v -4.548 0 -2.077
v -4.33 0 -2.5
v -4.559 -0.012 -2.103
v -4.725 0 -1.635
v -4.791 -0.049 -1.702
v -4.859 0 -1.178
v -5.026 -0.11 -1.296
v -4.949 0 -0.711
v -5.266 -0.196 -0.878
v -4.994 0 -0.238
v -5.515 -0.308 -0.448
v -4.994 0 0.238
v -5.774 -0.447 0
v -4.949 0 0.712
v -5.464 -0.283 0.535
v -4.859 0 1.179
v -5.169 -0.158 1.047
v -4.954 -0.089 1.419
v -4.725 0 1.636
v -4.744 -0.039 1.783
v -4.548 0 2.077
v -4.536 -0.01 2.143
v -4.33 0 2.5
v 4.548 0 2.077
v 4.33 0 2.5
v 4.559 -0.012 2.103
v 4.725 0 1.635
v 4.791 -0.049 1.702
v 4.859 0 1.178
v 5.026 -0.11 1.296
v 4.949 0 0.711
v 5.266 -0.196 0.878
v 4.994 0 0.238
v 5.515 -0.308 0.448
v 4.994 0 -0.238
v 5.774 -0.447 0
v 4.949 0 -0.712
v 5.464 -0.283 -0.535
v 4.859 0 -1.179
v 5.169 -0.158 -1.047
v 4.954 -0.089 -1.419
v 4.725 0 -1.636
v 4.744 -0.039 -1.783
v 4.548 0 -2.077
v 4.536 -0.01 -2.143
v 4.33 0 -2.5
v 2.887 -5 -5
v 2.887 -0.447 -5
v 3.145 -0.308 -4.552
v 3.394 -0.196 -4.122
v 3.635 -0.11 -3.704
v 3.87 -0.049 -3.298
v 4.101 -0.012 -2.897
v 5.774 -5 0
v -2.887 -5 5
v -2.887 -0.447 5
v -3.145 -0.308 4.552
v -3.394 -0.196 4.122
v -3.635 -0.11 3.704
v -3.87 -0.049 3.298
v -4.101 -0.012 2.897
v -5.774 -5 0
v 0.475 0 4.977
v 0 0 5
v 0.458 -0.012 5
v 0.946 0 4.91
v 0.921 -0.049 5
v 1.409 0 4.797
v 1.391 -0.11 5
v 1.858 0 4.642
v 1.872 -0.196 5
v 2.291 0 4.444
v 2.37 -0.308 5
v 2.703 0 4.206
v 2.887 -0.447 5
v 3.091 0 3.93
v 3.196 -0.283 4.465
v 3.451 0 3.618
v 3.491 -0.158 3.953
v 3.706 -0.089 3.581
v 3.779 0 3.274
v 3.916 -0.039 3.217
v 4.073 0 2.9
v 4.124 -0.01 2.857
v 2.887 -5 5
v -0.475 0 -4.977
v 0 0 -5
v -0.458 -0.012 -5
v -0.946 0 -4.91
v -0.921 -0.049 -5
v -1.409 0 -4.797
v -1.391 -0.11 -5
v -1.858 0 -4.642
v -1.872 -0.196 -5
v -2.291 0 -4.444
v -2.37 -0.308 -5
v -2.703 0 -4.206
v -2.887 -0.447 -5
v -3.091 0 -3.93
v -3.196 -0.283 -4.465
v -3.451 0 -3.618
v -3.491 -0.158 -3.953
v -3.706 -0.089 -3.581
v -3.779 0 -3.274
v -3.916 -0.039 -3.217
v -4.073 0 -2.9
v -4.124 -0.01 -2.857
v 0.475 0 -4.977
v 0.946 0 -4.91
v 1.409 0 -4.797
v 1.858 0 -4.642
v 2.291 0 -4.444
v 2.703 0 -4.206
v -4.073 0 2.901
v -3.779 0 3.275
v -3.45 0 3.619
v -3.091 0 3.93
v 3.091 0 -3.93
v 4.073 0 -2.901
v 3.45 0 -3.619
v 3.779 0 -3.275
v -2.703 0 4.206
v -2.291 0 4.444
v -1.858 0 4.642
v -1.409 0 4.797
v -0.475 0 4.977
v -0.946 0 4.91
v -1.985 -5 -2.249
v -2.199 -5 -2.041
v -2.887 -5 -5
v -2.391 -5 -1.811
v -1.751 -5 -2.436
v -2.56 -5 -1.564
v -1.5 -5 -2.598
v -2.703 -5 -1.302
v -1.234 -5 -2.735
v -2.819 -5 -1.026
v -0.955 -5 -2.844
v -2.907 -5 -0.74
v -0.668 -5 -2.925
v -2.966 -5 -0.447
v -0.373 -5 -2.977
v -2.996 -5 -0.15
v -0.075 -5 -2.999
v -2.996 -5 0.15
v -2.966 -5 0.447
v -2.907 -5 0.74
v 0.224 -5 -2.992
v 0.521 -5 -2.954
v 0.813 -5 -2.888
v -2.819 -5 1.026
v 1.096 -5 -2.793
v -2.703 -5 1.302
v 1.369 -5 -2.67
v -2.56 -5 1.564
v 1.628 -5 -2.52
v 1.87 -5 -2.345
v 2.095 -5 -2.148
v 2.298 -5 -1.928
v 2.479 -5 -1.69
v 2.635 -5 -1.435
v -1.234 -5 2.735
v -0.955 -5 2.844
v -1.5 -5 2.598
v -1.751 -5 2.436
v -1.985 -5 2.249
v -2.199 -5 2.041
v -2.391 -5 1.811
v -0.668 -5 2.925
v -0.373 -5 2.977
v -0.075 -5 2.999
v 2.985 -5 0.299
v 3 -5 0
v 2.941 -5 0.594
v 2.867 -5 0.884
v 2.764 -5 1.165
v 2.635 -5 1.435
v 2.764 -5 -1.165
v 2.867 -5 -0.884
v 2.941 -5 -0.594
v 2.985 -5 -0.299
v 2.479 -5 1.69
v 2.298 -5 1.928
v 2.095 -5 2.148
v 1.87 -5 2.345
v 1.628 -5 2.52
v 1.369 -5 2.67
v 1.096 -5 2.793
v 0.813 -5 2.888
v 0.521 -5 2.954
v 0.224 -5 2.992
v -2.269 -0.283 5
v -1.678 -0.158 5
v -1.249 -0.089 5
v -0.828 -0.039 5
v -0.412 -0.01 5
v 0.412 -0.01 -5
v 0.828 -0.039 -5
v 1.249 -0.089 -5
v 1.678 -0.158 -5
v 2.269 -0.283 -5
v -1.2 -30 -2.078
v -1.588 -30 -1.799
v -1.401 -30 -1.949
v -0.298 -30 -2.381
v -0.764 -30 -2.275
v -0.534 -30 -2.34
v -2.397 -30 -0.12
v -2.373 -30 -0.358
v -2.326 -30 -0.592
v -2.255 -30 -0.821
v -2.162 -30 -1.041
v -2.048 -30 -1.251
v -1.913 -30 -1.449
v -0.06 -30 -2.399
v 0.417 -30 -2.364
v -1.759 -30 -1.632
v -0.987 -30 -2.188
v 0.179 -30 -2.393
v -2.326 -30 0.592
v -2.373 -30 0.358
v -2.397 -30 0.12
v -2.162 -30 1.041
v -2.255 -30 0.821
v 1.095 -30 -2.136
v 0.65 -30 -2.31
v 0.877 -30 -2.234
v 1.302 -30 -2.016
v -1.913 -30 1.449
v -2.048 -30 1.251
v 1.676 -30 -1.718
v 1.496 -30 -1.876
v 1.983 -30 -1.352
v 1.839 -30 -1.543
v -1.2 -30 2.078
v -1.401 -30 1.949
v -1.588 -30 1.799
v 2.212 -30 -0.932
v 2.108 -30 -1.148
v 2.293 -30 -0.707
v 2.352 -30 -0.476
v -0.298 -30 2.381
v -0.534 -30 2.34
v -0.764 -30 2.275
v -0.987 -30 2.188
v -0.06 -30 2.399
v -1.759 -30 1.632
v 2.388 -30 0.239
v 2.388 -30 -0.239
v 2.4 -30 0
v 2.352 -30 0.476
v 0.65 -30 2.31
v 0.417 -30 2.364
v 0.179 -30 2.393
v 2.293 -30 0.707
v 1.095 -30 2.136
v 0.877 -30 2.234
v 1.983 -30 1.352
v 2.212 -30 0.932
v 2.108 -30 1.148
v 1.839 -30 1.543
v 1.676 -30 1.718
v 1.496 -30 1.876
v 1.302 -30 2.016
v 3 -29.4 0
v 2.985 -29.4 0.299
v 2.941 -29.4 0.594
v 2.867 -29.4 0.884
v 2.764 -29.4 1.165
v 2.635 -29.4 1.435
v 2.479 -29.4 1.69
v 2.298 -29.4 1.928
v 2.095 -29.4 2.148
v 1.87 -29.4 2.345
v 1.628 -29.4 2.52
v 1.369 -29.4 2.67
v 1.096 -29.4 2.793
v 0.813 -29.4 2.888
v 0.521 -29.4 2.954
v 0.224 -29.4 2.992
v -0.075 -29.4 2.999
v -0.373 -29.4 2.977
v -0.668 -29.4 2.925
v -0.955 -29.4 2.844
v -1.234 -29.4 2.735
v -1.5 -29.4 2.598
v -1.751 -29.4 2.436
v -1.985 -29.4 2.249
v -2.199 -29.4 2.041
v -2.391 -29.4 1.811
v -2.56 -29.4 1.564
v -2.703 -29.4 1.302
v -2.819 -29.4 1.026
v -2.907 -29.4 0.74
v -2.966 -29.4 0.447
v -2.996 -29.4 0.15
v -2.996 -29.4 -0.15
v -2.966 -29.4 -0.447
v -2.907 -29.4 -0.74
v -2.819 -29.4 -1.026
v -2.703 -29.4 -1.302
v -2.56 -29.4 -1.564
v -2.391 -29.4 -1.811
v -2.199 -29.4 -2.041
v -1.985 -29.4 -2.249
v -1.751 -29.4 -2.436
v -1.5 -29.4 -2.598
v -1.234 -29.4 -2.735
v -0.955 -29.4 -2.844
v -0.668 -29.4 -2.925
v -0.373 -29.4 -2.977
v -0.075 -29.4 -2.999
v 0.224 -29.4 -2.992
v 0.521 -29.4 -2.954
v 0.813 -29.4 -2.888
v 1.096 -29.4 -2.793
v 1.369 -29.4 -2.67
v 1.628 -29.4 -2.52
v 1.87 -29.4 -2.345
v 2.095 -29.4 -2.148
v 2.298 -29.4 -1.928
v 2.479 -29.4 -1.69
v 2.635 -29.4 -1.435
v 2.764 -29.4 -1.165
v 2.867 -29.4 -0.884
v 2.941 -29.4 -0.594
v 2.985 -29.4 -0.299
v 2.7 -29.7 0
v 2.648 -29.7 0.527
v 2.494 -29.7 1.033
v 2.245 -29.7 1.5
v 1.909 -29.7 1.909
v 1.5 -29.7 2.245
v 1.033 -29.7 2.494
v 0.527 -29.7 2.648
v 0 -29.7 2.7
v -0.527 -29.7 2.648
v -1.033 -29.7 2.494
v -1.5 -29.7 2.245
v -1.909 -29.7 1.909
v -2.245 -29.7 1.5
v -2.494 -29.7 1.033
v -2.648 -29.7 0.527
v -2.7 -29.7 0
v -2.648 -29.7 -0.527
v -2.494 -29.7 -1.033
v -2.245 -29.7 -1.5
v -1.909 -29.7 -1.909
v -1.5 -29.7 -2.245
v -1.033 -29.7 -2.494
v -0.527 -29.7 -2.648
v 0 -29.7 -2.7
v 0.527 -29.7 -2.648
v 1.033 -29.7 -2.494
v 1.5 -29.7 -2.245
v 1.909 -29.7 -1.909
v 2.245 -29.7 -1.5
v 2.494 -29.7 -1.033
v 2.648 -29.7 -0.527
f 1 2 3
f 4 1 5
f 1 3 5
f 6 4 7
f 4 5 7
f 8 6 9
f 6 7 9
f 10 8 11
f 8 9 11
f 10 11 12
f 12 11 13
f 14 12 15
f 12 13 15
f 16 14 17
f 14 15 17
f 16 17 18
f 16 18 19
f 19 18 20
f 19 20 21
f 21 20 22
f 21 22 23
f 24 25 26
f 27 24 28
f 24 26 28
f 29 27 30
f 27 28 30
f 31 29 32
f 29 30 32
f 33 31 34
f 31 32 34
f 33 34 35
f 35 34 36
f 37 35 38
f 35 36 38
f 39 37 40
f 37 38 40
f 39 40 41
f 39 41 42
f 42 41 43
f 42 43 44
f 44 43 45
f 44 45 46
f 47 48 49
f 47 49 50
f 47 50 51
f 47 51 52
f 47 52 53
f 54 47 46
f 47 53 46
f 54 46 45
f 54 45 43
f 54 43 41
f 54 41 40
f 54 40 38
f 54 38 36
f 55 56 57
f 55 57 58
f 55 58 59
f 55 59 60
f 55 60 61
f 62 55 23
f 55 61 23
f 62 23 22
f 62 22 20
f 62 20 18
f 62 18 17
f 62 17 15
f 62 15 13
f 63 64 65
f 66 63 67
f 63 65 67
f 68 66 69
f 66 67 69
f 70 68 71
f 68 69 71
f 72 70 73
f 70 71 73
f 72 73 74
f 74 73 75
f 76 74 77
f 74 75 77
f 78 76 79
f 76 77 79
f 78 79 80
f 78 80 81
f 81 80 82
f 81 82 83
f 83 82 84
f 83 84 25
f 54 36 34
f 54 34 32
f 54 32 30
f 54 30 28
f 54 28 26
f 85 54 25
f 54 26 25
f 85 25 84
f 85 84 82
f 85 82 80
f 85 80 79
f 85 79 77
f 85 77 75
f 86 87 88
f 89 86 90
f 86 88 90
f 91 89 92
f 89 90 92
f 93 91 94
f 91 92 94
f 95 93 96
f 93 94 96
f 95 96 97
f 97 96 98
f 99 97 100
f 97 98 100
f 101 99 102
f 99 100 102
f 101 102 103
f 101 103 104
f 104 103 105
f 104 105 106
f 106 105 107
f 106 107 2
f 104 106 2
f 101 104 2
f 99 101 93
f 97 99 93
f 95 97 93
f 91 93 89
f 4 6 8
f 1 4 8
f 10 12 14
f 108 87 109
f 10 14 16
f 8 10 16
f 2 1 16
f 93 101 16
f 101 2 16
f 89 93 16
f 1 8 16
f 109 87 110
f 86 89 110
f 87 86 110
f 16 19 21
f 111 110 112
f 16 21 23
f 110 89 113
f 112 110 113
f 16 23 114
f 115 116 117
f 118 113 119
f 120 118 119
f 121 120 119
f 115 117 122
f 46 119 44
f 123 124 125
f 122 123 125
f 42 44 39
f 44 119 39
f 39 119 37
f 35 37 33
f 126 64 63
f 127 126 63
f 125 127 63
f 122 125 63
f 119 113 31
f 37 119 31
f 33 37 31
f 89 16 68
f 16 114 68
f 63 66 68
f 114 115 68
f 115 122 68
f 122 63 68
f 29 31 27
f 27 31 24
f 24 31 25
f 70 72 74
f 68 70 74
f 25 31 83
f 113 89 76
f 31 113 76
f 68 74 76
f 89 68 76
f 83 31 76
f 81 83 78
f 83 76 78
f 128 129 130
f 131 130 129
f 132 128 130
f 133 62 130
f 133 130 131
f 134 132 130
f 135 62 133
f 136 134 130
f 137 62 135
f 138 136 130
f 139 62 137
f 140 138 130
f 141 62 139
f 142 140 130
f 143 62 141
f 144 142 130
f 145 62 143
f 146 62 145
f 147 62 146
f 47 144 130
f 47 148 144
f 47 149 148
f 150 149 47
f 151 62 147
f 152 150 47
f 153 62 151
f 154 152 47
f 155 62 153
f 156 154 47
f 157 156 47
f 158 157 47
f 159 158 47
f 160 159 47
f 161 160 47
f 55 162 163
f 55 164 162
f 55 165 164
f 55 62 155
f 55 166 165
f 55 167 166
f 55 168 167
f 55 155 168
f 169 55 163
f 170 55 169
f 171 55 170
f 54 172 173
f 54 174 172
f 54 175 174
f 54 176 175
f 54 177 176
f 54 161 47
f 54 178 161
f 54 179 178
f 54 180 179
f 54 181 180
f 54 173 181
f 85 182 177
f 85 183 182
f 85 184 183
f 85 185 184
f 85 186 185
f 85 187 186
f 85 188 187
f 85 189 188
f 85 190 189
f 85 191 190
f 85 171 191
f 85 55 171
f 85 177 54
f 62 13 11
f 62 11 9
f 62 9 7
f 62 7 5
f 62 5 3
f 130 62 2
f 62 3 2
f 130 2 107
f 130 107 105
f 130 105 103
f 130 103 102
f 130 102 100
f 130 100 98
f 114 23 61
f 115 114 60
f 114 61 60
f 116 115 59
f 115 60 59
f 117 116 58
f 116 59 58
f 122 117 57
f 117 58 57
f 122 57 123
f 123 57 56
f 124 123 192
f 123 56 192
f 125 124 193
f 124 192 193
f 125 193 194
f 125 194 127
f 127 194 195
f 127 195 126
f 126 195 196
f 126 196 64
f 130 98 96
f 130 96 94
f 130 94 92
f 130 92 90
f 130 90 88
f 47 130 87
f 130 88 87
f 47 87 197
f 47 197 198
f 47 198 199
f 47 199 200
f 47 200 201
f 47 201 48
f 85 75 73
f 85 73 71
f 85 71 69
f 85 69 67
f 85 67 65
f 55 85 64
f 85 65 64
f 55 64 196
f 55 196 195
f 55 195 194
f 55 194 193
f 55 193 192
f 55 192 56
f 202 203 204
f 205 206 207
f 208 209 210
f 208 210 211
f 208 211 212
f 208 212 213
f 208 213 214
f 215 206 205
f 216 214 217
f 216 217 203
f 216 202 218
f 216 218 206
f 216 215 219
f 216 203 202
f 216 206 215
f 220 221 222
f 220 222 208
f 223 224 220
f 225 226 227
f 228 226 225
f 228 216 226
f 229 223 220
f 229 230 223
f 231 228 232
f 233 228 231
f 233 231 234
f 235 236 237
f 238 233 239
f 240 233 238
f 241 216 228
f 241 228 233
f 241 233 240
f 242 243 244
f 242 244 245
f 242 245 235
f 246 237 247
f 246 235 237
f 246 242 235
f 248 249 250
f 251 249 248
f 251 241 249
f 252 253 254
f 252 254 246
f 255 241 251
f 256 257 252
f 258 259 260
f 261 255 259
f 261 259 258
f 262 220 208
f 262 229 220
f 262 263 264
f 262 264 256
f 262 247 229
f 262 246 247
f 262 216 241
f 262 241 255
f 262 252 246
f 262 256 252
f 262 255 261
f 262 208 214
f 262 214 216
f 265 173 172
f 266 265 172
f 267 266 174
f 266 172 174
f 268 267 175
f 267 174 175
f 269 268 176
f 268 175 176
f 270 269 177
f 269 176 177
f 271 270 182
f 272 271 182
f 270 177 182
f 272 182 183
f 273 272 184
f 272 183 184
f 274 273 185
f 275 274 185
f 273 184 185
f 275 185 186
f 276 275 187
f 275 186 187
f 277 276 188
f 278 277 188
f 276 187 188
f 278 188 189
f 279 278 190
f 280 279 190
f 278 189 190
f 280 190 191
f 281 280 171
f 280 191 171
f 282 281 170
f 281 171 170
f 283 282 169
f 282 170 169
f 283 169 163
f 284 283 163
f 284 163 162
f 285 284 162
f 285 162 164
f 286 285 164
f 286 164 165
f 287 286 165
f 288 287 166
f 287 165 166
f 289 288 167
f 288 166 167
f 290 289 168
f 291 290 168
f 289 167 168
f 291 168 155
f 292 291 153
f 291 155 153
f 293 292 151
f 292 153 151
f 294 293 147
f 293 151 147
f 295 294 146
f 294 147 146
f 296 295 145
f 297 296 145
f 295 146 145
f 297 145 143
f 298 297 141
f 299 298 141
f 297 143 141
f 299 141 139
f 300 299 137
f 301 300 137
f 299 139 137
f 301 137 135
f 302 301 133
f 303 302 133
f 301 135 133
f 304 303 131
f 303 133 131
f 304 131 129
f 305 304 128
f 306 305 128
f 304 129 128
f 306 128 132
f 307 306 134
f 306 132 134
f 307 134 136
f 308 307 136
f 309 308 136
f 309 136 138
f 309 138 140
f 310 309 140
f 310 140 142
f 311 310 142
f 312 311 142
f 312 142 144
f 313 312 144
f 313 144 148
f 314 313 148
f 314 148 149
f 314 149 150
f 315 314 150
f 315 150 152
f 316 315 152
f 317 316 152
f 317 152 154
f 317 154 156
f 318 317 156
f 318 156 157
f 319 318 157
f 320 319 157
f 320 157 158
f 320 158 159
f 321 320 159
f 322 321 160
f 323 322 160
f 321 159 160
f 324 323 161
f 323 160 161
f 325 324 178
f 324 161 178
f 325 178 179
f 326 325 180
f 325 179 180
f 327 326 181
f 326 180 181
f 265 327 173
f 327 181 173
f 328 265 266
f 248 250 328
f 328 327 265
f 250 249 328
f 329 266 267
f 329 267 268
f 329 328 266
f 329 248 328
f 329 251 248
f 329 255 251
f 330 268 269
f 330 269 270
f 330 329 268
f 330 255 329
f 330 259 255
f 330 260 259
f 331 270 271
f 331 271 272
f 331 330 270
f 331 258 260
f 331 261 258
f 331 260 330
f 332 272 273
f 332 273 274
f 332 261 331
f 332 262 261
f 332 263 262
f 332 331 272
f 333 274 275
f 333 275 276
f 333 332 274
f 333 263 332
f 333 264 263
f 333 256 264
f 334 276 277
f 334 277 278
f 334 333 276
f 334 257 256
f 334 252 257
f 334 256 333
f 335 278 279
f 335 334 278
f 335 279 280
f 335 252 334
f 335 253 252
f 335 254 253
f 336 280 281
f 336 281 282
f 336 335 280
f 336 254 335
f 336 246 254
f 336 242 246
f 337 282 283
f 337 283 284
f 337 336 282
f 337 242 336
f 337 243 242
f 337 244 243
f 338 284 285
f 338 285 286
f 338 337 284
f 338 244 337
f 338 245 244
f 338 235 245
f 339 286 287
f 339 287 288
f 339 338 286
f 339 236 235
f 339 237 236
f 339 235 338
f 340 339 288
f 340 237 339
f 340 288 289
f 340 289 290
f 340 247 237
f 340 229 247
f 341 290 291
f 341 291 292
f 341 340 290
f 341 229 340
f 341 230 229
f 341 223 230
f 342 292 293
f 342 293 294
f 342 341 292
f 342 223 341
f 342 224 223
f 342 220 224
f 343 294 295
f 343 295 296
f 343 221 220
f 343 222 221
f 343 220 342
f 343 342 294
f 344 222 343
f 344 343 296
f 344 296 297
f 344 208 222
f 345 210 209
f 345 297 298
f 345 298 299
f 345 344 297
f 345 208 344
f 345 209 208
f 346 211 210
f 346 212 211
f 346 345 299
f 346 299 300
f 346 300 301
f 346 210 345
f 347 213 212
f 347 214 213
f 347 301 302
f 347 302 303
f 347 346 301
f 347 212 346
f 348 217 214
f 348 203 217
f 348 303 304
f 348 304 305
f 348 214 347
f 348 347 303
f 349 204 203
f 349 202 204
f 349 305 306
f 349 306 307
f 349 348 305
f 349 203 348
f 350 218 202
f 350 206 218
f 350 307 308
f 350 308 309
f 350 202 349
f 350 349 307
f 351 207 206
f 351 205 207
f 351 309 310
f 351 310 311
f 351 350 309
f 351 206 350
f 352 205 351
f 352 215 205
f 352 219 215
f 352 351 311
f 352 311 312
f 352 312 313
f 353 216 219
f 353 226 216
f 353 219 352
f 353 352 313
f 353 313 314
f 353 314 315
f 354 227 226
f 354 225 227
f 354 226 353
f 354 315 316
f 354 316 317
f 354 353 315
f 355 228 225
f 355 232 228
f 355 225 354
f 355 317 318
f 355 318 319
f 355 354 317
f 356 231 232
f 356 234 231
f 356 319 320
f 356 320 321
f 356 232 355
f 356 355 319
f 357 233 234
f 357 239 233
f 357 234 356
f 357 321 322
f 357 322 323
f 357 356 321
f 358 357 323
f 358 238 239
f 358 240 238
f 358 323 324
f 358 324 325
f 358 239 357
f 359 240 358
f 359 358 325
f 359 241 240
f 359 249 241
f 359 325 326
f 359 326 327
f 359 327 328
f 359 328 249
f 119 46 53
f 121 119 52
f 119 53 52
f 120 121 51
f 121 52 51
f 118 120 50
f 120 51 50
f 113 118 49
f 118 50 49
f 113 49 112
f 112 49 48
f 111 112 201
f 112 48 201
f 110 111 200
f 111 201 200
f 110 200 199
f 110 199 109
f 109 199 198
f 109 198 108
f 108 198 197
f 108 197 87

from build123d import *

# Parameters (mm, degrees)
F1_DEPTH = 5
F2_R     = 3
F3_DEPTH = 25
F4_SIZE  = 0.6


with BuildPart() as f1:
    # F0 (on Front) → F1 (new body)
    with BuildSketch(Plane.XZ):
        Polygon((2.886751, -5), (5.773503, 0), (2.886751, 5), (-2.886751, 5), (-5.773503, 0), (-2.886751, -5), align=None)
    extrude(amount=F1_DEPTH)

    # F2 (on face) → F3 (join)
    with BuildSketch(Plane.XZ.offset(5)):
        Circle(F2_R)
    extrude(amount=F3_DEPTH)

    # F4
    f4_edges = [f1.edges().sort_by_distance(p)[0] for p in [
        (-3, -30, 0),
    ]]
    chamfer(f4_edges, length=F4_SIZE)

    # F5 (on Right) → F6 (revolve, cut)
    with BuildSketch(Plane.YZ):
        Polygon((2, -1.535898), (-2, -8.464102), (2, -8.464102), align=None)
    revolve(axis=Axis((0, -5, 0), (0, 1, 0)), mode=Mode.SUBTRACT)


solid = f1.part
